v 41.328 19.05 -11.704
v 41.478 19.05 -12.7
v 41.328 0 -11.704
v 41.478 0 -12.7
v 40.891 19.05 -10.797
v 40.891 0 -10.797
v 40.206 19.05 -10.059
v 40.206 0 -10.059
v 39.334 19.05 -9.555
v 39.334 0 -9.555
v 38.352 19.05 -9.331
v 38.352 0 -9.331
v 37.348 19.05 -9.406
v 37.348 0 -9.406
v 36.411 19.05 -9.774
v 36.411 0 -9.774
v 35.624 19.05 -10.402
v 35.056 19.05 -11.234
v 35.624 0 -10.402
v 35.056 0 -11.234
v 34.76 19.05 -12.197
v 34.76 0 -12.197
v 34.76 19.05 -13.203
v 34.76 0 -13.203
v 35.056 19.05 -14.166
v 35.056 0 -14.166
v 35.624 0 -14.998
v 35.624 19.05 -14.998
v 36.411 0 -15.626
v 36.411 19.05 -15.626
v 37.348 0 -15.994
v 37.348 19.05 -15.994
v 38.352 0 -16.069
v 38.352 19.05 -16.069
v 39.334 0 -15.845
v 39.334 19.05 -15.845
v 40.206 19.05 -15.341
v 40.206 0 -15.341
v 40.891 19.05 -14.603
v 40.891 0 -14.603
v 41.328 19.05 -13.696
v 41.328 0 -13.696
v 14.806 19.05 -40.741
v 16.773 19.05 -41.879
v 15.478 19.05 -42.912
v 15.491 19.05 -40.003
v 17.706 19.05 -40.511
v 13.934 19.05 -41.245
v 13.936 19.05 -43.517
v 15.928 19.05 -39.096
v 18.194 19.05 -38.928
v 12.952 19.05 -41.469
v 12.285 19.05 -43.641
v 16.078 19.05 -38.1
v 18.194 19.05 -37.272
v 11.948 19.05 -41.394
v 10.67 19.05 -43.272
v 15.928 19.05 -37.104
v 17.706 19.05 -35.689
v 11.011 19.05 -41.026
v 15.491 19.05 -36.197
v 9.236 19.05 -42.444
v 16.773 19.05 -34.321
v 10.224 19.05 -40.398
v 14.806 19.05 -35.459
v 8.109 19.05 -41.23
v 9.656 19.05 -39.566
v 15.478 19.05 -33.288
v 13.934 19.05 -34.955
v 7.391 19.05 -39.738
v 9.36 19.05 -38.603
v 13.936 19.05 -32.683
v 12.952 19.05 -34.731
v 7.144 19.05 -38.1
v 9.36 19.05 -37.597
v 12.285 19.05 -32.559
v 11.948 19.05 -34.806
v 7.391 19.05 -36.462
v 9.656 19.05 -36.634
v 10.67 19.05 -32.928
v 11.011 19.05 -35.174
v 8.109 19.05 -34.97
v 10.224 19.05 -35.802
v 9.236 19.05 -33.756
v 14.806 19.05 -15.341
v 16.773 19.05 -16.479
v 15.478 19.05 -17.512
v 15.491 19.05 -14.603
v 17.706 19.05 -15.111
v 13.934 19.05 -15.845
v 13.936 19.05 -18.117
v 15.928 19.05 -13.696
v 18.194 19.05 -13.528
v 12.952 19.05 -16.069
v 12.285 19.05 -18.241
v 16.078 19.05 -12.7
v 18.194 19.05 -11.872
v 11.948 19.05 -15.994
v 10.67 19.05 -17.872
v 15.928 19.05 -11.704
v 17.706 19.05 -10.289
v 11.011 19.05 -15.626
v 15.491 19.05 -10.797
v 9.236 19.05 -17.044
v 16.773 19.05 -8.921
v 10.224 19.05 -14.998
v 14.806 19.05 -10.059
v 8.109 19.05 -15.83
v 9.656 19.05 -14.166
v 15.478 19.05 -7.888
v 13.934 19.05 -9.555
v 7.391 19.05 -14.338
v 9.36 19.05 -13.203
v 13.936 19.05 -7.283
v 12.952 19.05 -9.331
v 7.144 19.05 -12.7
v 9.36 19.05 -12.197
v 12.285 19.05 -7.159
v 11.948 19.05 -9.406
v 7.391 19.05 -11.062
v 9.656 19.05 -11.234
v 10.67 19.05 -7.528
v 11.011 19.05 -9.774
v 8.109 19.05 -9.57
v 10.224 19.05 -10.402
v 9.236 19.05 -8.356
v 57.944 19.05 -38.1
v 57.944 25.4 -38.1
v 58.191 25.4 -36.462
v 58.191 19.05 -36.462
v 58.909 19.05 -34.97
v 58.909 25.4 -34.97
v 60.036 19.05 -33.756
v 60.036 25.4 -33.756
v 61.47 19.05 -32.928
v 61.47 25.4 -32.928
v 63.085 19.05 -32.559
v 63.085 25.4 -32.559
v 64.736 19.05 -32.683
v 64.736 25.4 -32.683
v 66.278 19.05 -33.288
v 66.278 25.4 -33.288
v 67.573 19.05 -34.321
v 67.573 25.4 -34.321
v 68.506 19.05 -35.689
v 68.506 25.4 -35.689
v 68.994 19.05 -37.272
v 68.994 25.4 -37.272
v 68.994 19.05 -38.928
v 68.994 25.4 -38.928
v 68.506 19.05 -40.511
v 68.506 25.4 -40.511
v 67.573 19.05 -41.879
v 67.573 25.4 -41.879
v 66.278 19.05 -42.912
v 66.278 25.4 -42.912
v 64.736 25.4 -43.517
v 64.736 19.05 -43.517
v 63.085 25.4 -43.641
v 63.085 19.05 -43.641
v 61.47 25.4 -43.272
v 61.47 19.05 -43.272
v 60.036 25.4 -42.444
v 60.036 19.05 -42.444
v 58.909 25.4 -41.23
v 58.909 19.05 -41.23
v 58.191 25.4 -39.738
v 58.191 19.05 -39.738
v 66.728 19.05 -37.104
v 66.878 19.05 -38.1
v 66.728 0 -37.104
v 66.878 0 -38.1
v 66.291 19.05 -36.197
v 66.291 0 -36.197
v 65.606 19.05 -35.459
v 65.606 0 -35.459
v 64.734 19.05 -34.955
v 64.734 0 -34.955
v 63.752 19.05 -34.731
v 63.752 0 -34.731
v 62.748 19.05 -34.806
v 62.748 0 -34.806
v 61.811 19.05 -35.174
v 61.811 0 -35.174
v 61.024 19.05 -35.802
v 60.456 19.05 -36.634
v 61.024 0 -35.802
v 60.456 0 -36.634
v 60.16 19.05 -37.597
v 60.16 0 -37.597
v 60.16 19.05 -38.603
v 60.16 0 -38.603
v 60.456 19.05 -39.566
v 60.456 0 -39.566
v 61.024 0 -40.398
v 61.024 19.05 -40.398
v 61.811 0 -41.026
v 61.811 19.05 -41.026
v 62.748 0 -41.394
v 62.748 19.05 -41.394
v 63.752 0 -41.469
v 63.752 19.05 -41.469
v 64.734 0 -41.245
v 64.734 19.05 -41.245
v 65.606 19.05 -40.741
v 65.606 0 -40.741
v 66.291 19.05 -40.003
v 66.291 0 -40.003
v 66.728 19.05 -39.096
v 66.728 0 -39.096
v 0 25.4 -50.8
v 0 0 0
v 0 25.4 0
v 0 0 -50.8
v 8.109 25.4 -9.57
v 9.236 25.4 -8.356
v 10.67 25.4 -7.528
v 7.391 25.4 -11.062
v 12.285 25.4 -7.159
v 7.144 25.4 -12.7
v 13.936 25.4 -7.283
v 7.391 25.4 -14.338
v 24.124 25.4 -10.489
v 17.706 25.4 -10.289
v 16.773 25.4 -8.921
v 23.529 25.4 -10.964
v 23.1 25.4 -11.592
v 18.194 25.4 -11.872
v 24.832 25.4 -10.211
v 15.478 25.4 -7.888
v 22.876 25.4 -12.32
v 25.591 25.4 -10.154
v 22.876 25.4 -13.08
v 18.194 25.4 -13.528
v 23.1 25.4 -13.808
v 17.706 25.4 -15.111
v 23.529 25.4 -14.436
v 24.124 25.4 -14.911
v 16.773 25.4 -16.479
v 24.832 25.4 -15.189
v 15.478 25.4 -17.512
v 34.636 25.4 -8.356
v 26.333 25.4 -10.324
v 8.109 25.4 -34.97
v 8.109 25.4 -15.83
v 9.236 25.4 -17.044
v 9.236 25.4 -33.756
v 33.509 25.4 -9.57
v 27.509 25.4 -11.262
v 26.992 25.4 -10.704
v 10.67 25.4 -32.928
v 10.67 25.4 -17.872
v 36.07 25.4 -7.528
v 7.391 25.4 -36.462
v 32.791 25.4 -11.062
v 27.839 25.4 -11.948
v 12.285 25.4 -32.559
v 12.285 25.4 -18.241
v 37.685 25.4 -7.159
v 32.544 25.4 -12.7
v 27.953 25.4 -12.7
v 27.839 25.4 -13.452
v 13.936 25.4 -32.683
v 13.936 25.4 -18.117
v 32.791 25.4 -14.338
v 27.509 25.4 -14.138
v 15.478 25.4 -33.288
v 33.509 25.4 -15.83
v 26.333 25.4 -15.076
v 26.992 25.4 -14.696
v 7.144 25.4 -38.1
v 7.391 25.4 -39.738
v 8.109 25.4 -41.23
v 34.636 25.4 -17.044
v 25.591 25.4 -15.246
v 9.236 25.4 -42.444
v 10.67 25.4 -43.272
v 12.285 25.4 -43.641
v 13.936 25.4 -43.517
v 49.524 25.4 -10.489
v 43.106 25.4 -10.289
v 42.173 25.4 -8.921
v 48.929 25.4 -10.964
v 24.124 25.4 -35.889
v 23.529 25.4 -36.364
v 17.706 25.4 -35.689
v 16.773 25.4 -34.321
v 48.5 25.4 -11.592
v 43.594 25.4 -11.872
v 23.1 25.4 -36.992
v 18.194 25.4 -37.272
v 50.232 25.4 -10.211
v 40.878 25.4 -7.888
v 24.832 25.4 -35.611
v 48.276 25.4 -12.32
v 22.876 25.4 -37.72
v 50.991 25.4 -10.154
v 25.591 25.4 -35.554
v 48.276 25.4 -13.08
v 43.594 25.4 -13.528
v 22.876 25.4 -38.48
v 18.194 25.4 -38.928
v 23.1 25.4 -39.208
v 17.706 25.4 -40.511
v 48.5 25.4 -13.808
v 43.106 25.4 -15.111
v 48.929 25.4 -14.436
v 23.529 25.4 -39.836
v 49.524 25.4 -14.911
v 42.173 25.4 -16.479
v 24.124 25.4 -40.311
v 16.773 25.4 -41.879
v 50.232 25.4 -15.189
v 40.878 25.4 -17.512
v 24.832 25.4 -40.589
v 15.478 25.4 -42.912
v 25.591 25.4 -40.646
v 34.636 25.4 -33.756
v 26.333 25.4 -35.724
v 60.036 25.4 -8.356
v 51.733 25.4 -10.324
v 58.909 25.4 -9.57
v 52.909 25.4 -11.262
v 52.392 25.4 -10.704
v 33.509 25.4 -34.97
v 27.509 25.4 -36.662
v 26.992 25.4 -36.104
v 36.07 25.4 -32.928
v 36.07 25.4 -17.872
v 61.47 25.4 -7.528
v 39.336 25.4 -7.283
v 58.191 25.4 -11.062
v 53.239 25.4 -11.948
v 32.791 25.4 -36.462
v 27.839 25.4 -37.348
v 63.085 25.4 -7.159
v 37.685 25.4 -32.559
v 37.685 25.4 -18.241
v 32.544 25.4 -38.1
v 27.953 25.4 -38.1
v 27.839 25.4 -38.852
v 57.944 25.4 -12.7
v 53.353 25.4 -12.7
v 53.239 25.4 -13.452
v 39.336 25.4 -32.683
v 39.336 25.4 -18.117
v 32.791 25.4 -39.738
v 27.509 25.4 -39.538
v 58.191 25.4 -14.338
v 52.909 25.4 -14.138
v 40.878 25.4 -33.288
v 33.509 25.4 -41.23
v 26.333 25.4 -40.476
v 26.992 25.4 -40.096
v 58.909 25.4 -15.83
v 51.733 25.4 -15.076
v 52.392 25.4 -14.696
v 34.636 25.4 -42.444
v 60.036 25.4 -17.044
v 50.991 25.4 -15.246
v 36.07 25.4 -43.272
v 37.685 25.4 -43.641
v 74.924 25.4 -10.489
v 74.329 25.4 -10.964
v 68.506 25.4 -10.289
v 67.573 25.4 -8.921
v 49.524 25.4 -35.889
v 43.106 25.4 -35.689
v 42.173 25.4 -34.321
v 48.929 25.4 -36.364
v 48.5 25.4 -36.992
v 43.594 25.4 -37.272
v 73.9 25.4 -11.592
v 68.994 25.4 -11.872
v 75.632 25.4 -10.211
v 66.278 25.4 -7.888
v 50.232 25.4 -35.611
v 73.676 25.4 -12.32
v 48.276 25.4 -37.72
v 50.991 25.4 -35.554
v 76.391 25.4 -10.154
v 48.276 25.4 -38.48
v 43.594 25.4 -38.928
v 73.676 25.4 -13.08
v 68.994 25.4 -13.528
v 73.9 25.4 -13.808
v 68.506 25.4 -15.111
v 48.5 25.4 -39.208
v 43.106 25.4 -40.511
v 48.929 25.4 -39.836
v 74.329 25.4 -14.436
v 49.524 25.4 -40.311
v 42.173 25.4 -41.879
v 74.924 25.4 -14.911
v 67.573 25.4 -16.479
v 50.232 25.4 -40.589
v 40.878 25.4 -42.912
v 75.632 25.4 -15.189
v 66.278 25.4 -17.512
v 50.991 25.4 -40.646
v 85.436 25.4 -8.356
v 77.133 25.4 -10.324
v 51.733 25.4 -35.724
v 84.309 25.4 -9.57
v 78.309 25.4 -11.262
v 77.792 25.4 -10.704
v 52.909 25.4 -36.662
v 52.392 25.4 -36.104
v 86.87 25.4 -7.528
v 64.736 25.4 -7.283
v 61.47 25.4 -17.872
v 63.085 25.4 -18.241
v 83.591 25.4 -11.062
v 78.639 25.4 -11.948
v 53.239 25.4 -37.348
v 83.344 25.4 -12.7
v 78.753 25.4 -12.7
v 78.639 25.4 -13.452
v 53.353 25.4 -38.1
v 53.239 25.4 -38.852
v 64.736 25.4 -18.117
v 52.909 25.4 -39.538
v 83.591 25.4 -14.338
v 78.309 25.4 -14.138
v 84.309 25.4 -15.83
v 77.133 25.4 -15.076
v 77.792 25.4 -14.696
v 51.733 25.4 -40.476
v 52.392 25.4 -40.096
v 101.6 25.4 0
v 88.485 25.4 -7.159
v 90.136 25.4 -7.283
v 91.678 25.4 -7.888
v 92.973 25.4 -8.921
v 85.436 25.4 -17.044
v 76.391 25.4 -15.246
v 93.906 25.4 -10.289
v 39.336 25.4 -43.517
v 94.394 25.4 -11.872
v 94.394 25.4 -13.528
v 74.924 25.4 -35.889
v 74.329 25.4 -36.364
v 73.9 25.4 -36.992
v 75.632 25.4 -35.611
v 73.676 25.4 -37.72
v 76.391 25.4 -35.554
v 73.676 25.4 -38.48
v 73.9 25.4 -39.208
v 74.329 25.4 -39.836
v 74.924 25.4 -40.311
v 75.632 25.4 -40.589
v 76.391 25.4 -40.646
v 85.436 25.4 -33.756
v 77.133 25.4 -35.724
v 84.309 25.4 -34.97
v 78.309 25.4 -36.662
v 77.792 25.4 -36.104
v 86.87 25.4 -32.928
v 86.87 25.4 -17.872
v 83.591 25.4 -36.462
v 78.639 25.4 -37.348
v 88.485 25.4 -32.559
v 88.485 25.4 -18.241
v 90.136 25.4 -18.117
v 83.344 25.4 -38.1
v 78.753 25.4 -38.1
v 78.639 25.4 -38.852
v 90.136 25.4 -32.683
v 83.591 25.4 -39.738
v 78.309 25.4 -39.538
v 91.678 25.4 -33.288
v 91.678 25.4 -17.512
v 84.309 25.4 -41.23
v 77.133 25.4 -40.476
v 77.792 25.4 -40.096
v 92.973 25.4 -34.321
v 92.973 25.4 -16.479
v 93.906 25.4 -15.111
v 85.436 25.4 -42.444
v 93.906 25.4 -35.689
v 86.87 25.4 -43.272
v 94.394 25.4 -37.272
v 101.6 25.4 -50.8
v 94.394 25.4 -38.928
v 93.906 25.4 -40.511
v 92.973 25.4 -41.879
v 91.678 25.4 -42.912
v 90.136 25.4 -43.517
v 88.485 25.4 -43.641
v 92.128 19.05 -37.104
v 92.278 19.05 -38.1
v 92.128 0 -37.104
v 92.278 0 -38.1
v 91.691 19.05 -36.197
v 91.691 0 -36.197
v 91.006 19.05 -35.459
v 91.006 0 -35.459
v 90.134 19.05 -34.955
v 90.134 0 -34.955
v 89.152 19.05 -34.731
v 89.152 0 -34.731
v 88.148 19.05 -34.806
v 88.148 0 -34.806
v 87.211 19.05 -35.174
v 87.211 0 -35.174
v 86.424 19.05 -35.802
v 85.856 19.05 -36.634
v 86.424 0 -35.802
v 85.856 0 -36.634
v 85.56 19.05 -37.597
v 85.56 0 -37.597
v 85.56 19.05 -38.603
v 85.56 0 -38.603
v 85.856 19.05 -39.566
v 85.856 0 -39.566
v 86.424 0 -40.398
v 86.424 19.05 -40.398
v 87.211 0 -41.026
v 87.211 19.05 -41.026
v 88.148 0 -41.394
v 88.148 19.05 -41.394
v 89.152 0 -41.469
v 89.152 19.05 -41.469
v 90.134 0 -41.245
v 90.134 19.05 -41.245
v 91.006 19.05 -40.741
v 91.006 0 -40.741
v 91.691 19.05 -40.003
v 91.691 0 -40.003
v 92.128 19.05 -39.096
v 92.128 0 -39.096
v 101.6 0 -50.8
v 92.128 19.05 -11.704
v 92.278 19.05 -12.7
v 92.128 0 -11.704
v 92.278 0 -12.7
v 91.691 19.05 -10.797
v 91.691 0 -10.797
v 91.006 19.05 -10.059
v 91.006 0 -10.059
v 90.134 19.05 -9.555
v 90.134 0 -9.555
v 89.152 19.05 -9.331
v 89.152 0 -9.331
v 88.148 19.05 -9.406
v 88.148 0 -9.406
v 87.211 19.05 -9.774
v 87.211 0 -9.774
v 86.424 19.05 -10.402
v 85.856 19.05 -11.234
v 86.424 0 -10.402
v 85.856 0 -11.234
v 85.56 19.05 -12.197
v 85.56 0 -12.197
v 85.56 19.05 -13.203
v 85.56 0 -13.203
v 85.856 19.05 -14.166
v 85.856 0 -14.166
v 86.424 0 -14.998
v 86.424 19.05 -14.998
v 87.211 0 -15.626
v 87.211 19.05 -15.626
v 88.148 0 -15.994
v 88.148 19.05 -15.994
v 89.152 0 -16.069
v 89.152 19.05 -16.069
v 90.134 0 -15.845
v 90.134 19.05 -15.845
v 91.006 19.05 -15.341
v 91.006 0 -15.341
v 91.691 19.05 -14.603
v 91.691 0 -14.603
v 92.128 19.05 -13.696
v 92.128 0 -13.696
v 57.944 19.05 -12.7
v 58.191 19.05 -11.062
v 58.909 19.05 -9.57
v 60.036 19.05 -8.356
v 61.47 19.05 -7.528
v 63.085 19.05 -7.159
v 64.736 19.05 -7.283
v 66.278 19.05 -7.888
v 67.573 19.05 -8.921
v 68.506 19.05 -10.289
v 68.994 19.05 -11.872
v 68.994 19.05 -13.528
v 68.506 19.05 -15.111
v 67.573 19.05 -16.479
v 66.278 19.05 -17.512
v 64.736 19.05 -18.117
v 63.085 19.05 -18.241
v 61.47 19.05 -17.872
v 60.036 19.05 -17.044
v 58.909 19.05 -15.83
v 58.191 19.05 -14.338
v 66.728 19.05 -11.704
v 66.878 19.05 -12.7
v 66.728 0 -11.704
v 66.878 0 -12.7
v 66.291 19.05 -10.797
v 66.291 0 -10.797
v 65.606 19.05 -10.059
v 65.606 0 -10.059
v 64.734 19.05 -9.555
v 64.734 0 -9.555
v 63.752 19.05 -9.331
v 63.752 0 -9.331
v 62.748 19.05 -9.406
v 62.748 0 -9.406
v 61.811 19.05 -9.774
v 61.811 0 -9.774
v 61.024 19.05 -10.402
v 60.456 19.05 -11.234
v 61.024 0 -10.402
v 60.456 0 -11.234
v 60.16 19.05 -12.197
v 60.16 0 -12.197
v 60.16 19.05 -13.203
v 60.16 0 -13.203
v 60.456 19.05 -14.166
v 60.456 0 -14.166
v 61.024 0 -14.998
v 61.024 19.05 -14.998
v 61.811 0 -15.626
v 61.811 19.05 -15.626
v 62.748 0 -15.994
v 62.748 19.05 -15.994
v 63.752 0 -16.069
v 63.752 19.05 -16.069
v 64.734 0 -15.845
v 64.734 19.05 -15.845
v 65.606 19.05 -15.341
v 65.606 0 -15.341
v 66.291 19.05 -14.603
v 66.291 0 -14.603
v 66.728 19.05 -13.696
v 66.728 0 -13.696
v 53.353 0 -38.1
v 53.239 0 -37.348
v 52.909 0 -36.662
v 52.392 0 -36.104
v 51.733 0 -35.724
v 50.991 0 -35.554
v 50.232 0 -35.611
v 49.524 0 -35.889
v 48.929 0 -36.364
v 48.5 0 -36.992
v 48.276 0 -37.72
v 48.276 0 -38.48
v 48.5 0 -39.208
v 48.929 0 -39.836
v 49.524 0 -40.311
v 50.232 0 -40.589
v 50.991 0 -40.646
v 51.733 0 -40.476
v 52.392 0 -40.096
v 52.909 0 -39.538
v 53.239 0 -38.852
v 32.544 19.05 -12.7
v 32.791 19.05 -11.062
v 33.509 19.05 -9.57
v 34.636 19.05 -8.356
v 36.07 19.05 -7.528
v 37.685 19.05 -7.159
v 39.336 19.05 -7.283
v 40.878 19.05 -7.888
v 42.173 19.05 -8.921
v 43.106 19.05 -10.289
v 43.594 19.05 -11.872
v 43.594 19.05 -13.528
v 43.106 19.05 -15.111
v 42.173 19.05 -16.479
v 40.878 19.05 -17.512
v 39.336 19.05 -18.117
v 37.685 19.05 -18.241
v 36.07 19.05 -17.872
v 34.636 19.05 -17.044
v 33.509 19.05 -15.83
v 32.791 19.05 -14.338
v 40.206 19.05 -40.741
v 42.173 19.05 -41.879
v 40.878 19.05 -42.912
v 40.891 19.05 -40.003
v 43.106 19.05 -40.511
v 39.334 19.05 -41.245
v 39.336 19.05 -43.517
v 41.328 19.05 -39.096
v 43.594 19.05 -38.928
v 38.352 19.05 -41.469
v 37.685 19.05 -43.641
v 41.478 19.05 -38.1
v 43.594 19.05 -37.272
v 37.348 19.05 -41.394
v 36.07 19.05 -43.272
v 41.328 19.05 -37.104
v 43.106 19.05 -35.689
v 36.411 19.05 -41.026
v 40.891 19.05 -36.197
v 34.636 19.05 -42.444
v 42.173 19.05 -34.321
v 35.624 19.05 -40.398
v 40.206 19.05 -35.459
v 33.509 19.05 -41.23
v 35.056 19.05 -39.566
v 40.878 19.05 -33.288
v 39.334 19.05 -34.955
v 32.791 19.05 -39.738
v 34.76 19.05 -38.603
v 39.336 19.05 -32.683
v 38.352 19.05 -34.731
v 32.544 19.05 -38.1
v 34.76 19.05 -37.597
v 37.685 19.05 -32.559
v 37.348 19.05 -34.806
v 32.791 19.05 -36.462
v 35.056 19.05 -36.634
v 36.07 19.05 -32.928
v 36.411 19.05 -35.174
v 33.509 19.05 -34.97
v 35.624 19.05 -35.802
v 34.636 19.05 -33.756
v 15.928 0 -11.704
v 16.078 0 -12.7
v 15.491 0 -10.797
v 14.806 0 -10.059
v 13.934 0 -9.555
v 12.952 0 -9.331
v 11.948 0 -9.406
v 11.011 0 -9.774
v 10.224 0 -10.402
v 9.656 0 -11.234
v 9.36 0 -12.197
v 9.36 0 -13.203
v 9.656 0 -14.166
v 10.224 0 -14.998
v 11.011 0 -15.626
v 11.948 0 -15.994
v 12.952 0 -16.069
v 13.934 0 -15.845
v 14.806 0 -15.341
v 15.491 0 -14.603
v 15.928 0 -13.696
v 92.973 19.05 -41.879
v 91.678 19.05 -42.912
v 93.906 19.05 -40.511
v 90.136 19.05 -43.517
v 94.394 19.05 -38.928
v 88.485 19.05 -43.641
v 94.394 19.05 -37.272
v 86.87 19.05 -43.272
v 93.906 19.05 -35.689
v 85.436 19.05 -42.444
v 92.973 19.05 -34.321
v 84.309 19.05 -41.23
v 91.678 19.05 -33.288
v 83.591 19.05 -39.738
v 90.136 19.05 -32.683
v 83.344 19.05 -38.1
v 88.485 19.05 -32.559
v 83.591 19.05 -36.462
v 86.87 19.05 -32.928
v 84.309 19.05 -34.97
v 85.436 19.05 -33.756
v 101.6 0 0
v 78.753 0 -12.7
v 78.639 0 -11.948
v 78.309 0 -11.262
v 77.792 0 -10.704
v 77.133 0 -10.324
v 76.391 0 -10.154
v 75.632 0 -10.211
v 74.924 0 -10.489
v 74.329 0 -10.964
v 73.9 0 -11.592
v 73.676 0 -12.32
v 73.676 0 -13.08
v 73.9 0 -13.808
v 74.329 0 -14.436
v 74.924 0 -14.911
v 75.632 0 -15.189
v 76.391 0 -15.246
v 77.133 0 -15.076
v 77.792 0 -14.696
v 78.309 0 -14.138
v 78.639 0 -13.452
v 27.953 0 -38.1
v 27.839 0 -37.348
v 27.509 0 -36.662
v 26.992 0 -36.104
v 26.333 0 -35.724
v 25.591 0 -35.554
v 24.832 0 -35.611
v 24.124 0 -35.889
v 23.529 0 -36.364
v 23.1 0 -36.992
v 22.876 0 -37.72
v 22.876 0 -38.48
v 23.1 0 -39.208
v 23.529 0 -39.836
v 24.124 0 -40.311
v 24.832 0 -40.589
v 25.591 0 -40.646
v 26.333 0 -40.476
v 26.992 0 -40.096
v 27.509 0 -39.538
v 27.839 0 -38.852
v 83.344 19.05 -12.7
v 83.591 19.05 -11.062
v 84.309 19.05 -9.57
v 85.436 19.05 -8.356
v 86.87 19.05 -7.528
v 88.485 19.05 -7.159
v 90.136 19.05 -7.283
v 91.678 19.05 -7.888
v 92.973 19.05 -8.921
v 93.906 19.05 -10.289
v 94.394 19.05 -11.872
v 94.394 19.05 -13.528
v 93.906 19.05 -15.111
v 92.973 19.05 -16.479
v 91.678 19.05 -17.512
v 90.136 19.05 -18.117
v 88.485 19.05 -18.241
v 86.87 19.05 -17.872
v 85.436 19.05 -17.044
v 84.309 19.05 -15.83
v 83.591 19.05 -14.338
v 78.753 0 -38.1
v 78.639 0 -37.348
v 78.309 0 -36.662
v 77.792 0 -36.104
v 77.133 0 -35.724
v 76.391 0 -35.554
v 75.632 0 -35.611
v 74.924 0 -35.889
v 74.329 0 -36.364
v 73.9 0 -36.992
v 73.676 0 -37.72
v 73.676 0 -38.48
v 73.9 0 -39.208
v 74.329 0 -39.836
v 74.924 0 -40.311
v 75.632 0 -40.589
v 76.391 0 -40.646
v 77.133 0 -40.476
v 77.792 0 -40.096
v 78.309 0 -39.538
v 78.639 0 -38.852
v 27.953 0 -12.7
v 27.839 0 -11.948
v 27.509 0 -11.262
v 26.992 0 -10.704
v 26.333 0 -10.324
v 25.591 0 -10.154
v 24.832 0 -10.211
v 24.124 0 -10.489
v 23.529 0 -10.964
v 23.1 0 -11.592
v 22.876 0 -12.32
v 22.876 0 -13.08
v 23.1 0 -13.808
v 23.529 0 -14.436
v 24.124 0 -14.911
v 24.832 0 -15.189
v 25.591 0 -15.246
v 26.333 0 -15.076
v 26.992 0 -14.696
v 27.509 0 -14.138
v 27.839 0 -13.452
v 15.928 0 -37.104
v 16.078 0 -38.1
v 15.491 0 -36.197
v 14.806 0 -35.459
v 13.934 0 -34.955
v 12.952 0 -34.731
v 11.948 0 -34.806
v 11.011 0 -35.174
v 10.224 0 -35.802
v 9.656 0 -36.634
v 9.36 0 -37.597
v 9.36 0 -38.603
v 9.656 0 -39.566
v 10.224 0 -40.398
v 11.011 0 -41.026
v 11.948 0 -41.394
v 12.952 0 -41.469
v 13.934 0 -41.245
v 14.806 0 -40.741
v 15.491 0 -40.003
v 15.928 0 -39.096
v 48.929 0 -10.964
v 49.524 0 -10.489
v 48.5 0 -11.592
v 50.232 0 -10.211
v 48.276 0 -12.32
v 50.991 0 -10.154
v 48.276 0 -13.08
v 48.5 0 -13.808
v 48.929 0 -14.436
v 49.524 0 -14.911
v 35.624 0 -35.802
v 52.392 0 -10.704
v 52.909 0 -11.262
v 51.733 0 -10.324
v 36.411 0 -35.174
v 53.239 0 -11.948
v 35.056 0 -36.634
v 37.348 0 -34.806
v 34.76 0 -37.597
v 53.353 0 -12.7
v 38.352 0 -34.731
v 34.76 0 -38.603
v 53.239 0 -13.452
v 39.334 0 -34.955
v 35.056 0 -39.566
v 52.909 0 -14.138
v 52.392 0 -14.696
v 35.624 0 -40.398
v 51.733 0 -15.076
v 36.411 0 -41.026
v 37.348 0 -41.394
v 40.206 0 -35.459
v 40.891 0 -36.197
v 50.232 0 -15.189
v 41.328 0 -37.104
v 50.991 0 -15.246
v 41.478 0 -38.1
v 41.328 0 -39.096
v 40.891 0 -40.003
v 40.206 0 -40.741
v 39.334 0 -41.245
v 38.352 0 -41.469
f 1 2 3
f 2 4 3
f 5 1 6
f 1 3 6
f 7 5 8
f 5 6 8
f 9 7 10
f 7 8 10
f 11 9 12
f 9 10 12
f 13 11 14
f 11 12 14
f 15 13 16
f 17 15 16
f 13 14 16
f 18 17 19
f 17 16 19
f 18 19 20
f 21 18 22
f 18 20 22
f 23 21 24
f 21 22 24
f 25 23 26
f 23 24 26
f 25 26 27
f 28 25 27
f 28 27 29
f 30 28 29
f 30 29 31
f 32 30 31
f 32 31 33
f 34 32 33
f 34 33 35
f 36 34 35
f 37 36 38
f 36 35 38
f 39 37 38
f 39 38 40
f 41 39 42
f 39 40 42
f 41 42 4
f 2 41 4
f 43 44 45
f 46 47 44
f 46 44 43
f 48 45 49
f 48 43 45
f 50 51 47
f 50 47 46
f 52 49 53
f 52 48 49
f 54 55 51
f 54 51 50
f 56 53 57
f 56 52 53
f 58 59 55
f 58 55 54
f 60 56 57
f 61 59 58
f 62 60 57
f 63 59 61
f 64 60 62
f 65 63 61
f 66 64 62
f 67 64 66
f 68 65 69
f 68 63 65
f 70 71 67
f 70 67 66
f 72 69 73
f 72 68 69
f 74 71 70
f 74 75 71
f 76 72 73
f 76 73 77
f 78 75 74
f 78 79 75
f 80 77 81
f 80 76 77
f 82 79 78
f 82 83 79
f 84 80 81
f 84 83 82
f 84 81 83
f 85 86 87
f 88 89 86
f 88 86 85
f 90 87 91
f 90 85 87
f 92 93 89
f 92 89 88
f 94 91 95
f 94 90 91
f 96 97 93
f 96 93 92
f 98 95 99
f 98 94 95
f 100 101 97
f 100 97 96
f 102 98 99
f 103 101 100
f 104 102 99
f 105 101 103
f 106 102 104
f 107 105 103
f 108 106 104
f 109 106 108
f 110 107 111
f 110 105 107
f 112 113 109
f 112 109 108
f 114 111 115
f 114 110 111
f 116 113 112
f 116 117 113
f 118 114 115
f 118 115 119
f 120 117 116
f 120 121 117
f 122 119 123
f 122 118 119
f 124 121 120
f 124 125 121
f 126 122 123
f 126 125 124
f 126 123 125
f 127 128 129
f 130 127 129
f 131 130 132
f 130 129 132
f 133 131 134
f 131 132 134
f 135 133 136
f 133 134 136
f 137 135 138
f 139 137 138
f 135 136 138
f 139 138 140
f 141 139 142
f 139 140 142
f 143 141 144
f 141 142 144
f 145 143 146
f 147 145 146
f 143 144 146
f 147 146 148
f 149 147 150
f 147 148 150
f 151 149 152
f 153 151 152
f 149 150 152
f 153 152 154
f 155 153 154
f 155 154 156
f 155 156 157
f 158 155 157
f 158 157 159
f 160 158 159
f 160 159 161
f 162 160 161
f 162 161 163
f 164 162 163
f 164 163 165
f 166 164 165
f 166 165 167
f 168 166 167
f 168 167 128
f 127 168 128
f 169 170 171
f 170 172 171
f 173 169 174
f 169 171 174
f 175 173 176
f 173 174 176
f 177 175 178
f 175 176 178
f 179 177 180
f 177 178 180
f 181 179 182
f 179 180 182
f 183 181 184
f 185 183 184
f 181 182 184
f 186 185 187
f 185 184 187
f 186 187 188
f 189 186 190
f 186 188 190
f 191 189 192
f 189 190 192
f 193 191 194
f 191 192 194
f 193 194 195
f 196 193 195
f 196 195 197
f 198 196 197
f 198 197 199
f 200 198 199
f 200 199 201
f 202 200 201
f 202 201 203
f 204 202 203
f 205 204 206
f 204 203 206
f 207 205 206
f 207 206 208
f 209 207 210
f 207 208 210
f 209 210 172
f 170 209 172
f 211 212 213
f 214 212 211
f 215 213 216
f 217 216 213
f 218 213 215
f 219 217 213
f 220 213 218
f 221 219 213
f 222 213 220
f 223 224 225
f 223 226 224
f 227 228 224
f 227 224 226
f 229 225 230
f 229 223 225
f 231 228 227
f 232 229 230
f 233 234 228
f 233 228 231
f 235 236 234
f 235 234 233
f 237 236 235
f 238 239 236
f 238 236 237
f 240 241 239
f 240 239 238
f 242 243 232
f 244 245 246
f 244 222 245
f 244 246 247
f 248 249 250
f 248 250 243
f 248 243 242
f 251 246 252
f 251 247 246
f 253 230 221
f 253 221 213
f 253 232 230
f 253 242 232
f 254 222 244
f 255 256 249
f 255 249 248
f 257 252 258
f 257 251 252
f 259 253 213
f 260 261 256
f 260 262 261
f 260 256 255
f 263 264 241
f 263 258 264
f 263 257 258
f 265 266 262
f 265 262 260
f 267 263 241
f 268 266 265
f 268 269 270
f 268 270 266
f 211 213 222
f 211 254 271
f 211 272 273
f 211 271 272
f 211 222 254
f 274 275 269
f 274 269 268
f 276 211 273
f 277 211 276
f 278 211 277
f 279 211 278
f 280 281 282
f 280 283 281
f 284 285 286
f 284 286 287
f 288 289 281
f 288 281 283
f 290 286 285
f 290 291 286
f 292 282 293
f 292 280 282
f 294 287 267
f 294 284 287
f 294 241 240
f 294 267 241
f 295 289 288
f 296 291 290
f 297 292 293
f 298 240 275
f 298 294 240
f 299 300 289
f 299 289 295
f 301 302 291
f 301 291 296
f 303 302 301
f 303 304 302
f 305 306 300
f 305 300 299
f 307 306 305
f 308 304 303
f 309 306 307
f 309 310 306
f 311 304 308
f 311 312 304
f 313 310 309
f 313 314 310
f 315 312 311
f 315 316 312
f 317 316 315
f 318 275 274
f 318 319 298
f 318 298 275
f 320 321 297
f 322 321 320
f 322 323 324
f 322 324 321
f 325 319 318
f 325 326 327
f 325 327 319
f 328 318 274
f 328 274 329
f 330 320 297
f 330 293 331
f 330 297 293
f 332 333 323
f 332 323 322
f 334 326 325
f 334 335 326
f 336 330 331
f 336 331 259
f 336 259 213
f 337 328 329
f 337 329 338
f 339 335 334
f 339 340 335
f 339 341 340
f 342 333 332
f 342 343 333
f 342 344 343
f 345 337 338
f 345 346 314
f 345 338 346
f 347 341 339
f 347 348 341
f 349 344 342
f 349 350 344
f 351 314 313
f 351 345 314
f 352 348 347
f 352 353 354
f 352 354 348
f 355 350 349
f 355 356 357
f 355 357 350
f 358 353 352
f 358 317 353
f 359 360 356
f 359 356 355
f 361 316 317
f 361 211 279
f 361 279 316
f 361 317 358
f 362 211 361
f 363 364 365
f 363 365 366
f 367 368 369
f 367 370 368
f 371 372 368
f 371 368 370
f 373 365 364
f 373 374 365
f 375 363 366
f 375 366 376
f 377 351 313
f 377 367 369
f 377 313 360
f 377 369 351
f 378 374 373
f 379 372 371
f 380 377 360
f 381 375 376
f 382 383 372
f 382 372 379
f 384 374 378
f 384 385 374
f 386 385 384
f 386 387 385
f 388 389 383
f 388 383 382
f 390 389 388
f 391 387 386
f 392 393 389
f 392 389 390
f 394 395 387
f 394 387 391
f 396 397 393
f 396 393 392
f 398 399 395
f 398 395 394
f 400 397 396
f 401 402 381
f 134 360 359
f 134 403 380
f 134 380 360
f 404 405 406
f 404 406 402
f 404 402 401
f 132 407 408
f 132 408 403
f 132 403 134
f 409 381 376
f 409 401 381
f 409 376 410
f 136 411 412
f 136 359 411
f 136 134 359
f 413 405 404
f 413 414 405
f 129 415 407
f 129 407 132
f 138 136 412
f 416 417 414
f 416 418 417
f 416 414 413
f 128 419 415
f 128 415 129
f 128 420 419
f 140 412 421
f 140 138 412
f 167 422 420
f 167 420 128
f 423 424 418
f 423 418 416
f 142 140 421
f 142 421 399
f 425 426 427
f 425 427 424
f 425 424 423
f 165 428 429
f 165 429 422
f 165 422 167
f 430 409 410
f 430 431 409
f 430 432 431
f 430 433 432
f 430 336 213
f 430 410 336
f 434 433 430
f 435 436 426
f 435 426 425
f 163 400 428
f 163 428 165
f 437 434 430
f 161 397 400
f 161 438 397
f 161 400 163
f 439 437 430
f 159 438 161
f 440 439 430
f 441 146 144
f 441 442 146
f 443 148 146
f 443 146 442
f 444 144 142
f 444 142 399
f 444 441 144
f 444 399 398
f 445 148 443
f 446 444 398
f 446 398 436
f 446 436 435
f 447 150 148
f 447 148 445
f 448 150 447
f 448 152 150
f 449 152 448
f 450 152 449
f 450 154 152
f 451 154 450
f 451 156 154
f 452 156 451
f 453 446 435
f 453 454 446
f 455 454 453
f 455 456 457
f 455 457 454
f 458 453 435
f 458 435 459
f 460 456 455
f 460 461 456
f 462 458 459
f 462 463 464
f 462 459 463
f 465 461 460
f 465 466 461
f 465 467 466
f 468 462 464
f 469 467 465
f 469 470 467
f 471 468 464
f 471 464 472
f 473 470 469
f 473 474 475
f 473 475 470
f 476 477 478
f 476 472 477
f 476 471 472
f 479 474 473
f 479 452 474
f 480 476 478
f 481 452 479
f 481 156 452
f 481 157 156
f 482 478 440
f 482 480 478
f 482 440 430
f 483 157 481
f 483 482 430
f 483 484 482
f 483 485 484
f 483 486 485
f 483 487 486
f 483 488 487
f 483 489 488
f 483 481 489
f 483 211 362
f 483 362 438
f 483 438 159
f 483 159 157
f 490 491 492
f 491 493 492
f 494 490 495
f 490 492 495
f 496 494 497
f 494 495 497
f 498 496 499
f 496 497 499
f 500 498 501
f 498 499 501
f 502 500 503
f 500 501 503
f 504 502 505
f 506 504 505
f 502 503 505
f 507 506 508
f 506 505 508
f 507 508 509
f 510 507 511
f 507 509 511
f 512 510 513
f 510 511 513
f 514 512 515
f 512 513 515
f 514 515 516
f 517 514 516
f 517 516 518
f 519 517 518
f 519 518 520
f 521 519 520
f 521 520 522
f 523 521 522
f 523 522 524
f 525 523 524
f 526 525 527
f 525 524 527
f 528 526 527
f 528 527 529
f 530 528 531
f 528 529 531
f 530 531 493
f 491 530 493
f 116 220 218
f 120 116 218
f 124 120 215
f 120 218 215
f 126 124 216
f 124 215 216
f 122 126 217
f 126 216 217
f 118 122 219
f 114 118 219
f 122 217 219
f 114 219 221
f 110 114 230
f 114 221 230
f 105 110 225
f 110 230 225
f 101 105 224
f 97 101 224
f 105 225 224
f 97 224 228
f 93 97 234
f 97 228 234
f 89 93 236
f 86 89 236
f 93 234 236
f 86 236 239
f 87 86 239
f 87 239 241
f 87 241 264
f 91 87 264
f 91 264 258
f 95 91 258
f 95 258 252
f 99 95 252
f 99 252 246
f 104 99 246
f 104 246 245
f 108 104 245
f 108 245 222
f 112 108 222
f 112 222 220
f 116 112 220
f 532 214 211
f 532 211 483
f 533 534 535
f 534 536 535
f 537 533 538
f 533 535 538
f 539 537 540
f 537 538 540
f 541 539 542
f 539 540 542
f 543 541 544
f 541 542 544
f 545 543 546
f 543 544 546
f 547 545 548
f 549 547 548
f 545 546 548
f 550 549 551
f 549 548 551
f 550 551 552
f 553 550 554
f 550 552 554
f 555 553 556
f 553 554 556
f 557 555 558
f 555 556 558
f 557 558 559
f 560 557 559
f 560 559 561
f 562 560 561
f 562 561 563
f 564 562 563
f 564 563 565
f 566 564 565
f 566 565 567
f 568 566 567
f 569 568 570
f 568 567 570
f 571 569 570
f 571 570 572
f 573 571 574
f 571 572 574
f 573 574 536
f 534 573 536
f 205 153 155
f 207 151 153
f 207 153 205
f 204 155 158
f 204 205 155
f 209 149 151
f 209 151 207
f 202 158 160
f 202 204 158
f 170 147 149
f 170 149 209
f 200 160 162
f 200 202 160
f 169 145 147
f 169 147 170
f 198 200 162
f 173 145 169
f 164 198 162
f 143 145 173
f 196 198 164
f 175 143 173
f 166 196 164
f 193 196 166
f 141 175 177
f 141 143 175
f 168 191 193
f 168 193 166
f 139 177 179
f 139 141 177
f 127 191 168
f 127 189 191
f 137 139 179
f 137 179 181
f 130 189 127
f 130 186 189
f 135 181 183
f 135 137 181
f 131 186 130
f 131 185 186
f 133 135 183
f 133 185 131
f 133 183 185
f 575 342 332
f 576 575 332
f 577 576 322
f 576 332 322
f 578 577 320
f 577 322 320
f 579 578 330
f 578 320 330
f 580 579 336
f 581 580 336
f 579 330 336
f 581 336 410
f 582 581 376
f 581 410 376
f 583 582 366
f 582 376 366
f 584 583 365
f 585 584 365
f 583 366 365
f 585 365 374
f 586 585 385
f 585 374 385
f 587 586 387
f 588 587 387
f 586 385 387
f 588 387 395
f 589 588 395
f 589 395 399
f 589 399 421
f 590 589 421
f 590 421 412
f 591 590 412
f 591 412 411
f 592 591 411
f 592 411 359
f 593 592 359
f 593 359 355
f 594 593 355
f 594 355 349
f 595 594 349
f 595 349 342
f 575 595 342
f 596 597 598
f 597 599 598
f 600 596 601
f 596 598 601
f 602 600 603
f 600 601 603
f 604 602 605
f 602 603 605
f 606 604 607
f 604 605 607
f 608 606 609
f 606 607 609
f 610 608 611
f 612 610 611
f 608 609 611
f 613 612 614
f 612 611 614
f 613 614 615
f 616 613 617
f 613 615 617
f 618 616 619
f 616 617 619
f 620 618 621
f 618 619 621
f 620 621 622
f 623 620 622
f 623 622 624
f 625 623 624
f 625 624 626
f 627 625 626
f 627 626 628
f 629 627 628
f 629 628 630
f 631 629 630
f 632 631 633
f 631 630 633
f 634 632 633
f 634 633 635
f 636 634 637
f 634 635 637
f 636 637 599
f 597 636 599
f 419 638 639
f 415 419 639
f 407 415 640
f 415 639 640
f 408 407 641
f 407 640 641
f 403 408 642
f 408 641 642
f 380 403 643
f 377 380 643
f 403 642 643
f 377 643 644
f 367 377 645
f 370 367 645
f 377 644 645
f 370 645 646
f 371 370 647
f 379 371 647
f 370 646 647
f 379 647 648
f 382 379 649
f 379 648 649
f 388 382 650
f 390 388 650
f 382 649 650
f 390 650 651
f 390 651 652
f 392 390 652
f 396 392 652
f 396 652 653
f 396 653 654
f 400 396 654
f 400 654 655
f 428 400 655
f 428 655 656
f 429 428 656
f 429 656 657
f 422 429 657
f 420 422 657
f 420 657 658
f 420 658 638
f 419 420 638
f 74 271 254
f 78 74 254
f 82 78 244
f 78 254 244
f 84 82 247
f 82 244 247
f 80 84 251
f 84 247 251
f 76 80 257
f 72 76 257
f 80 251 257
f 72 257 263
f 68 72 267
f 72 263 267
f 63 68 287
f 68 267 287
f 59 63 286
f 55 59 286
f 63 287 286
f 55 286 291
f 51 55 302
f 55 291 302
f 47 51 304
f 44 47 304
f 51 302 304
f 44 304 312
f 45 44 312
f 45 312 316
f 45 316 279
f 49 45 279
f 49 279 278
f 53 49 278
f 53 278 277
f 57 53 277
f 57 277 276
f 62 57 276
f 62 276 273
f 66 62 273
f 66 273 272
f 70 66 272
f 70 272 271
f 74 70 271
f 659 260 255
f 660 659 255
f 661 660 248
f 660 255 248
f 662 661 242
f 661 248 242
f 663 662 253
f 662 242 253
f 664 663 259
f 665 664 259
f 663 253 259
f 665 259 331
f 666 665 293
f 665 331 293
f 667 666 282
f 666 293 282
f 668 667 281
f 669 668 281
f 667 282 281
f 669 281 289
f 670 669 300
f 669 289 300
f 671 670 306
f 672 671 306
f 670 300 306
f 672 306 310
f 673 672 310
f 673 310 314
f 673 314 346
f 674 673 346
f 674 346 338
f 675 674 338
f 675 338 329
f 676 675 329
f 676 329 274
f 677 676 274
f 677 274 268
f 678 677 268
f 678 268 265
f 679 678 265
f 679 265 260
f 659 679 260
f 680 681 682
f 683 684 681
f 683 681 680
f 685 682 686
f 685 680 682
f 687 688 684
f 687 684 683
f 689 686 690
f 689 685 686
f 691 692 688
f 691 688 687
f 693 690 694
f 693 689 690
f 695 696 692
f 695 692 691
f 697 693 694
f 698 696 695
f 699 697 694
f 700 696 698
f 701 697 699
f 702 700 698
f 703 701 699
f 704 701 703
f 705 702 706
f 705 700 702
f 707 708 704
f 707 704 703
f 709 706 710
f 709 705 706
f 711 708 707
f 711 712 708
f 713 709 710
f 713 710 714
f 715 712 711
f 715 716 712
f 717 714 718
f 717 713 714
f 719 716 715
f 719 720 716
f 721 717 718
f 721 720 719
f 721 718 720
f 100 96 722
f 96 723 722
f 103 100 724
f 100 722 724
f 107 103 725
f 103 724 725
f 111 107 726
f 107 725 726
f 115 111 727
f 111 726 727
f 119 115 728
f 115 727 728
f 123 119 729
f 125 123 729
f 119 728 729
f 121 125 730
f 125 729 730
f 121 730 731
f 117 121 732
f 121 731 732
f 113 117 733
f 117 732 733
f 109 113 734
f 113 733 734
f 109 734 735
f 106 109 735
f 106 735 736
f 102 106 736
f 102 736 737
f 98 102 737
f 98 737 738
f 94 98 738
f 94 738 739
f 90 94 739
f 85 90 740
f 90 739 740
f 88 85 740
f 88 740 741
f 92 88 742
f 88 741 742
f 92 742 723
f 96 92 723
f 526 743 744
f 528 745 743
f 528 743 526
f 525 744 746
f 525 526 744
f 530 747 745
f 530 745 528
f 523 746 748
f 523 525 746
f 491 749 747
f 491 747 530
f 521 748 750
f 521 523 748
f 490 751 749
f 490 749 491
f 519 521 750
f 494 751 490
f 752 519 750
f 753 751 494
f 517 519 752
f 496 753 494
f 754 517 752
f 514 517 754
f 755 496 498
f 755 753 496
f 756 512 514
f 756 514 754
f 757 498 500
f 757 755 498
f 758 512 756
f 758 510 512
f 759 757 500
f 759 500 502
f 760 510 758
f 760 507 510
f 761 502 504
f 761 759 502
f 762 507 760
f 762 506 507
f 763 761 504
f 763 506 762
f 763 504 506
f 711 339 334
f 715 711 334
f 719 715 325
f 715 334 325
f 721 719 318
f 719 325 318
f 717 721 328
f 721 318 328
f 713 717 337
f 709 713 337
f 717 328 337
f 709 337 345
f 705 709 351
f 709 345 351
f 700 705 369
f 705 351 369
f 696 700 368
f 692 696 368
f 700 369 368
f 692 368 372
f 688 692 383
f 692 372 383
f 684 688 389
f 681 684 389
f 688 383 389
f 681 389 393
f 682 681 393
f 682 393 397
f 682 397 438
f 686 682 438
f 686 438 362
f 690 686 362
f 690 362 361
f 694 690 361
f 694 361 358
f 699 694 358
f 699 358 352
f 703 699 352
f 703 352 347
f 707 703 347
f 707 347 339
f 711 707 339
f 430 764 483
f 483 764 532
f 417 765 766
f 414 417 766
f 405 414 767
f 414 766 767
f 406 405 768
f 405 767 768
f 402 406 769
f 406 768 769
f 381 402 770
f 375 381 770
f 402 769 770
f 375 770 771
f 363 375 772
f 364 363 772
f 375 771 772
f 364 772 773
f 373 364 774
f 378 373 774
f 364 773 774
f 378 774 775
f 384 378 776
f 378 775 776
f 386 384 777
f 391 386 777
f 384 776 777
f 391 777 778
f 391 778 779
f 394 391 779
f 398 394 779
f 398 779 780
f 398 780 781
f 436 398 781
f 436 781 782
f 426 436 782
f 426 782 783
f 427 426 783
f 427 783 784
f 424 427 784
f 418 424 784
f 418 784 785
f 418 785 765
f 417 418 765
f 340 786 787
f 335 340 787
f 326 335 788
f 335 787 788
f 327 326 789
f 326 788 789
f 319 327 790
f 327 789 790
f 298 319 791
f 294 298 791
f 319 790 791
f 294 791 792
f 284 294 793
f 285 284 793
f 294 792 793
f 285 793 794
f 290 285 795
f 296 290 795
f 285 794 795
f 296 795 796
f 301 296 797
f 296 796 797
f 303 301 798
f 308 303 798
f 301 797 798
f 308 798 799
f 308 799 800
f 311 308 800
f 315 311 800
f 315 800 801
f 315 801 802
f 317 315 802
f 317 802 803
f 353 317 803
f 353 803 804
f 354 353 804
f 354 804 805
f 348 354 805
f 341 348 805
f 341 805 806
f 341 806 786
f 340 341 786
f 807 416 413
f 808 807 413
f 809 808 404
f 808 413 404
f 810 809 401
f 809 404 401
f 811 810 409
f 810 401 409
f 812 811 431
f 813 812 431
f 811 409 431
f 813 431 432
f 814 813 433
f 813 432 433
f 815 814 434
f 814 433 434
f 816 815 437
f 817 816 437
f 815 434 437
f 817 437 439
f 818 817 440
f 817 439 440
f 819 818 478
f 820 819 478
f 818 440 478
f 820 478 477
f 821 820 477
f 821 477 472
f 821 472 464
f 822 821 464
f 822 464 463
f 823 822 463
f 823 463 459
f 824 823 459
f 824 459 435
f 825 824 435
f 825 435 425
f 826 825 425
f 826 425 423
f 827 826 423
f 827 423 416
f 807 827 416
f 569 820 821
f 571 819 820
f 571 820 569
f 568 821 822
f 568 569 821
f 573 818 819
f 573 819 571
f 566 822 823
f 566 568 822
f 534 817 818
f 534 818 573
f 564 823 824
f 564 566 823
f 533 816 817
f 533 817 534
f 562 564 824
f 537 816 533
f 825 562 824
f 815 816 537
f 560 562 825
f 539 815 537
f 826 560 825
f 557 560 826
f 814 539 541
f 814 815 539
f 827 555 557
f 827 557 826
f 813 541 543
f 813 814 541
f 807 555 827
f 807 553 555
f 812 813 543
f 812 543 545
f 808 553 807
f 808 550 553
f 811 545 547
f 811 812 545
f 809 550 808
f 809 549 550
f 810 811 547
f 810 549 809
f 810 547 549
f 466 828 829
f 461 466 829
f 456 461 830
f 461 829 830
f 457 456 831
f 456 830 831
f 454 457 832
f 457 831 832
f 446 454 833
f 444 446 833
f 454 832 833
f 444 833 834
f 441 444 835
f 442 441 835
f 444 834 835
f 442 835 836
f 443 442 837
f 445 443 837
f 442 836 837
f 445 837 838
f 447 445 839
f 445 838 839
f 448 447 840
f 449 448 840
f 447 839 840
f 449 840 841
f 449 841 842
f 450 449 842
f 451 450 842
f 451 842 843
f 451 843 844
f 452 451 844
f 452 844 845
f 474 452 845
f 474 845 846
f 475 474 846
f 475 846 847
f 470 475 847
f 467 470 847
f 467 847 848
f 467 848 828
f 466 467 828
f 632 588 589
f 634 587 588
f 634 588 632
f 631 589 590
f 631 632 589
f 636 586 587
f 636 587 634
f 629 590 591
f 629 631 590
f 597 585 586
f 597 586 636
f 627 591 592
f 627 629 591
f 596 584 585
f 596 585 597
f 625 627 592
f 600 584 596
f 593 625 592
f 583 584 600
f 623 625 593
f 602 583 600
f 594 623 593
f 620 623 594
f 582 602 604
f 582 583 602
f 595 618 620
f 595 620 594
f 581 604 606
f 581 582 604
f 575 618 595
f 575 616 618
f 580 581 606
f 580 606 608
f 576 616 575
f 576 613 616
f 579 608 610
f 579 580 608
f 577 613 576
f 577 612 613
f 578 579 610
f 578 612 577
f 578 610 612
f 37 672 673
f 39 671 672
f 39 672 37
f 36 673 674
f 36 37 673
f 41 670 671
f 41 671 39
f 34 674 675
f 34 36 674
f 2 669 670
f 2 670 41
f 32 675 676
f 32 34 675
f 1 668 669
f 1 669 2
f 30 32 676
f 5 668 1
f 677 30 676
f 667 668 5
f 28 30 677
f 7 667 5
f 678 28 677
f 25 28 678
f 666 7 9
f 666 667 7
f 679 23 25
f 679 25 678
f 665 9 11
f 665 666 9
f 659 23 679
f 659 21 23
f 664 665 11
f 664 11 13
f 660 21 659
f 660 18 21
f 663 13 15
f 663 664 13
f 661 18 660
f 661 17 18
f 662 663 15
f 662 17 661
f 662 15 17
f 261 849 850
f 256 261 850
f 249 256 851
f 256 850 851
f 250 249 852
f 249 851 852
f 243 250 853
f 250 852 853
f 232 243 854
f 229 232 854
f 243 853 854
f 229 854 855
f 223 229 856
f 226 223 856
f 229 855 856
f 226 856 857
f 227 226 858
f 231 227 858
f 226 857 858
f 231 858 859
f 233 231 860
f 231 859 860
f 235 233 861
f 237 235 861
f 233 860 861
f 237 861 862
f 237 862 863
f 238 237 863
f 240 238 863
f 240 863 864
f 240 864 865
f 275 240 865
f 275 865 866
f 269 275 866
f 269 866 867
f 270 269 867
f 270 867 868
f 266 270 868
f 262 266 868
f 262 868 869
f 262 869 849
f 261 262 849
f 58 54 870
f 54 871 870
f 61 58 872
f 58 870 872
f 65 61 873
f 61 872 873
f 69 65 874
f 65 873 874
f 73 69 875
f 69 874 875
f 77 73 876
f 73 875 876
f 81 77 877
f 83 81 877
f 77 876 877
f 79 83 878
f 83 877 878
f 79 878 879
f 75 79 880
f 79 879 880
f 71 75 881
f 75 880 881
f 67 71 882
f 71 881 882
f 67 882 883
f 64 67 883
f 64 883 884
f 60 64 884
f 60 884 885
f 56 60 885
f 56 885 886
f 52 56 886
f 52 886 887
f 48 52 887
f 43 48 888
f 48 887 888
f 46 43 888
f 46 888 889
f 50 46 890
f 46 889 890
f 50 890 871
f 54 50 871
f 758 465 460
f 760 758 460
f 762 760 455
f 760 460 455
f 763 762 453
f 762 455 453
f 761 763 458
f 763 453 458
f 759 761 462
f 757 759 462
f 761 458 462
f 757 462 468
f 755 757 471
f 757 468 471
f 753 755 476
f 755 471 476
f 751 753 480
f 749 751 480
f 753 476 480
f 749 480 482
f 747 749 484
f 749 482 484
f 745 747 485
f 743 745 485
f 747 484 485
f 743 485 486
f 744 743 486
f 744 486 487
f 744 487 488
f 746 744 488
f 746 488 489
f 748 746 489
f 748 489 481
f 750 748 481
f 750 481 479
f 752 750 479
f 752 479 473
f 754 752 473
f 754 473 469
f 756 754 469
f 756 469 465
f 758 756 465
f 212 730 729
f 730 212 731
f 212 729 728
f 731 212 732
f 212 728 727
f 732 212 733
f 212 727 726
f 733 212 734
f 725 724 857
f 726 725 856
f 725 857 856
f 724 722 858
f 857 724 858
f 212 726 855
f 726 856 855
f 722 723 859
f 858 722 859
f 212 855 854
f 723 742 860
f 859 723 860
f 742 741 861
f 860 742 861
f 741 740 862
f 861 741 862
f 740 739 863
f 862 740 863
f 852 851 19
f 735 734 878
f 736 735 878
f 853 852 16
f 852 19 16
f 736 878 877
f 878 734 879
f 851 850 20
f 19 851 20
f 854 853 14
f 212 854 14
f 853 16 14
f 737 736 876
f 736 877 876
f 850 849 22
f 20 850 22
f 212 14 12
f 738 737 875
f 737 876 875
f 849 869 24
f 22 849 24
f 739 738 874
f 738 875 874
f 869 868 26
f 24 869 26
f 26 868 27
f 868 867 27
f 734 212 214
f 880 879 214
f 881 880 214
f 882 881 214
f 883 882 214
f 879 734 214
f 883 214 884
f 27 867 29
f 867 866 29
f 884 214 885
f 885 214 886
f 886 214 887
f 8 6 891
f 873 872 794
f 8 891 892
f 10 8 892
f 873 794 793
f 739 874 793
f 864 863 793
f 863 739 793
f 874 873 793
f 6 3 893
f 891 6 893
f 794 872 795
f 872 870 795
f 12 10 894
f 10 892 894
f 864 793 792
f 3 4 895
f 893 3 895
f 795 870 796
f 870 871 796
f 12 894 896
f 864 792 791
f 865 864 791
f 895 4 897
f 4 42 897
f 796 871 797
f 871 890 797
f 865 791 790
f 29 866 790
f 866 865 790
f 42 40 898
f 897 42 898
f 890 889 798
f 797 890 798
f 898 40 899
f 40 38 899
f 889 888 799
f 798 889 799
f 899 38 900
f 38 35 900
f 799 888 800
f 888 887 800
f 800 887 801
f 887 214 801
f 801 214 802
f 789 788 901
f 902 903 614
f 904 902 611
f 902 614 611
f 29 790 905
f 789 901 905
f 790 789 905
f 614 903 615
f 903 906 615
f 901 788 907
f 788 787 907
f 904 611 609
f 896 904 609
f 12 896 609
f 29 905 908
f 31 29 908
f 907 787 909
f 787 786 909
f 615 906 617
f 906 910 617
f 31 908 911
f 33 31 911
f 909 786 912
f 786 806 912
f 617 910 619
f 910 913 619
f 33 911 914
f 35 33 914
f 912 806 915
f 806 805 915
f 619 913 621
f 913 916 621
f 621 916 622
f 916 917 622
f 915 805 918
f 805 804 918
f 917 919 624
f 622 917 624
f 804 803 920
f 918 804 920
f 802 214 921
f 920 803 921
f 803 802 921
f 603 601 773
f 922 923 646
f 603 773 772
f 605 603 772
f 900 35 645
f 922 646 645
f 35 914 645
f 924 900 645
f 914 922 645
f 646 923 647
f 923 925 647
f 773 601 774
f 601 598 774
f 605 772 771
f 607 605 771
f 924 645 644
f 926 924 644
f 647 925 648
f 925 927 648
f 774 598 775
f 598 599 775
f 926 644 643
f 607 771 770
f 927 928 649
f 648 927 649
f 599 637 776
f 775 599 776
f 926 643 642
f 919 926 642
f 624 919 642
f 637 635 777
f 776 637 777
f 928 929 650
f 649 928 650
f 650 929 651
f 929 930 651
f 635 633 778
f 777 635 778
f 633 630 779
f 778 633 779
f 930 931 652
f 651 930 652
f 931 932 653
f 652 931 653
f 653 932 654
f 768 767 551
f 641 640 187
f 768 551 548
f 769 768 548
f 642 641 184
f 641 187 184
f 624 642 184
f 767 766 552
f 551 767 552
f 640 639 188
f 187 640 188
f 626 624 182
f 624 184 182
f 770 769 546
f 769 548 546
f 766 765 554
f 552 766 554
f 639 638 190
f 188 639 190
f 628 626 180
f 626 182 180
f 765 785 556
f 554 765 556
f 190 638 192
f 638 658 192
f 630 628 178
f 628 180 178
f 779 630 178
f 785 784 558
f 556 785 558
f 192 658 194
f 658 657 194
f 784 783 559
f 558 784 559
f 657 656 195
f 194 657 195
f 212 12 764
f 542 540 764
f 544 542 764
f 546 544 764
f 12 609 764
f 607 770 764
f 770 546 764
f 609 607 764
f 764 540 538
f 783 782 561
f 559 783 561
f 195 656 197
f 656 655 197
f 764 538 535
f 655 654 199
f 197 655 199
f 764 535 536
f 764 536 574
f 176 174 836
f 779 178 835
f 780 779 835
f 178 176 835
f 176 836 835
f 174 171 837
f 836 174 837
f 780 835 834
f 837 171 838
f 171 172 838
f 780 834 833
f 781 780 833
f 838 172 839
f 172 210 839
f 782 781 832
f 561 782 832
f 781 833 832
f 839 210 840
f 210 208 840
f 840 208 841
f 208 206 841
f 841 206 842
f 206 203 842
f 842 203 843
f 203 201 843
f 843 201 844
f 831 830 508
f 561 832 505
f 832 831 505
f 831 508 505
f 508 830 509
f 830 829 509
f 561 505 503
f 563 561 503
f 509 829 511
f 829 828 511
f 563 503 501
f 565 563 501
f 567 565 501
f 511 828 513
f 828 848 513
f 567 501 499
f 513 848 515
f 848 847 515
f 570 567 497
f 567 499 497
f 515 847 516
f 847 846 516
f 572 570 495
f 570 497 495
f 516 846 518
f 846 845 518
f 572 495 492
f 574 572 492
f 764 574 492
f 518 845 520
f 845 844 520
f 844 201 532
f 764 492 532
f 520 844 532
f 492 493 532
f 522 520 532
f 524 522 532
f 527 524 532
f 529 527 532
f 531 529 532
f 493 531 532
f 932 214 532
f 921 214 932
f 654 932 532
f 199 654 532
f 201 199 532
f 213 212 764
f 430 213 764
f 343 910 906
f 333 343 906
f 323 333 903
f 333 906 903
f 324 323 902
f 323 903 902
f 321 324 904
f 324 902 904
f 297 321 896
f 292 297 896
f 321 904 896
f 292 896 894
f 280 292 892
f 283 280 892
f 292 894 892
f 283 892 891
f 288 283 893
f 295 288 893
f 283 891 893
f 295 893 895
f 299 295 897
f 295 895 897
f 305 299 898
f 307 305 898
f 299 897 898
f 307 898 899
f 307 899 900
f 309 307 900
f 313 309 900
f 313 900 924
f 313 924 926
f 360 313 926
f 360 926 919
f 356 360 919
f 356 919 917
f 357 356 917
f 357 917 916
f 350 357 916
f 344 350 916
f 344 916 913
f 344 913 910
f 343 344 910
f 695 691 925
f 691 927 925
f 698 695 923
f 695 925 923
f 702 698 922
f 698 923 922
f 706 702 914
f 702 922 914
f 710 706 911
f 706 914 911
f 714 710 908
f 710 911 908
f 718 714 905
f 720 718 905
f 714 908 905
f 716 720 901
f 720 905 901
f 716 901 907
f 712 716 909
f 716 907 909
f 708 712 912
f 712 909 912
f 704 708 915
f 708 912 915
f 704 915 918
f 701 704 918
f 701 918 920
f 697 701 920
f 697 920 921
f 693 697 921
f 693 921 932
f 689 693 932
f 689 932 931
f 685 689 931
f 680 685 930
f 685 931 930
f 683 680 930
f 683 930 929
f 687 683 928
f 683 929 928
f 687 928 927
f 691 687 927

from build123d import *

# Parameters (mm, degrees)
SKETCH1_W                                        = 101.6
SKETCH1_H                                        = 50.8
BOSS_EXTRUDE1_DEPTH                              = 25.4
CBORE_FOR_1_4_SOCKET_HEAD_CAP_SCREW1_D           = 6.7564
CBORE_FOR_1_4_SOCKET_HEAD_CAP_SCREW1_CBORE_D     = 11.1125
CBORE_FOR_1_4_SOCKET_HEAD_CAP_SCREW1_CBORE_DEPTH = 6.35
LPATTERN1_COUNT                                  = 2
LPATTERN1_PITCH                                  = 25.4
LPATTERN1_COUNT_DIR2                             = 4
LPATTERN1_PITCH_DIR2                             = 25.4
F_1_4_20_TAPPED_HOLE1_D                          = 5.1054
LPATTERN2_COUNT                                  = 2
LPATTERN2_PITCH                                  = 25.4
LPATTERN2_COUNT_DIR2                             = 3
LPATTERN2_PITCH_DIR2                             = 25.4


with BuildPart() as part:
    # Sketch1 → Boss-Extrude1 (new body)
    with BuildSketch(Plane(origin=(0, 0, 0), x_dir=(1, 0, 0), z_dir=(0, 1, 0))):
        with Locations((50.8, 25.4)):
            Rectangle(SKETCH1_W, SKETCH1_H)
    extrude(amount=BOSS_EXTRUDE1_DEPTH)

    # CBORE for 1/4 Socket Head Cap Screw1 (through all)
    with Locations(Plane(origin=(0, 25.4, 0), x_dir=(-1, 0, 0), z_dir=(0, 1, 0))):
        with Locations((-12.7, -12.7)):
            cbore_for_1_4_socket_head_cap_screw1 = CounterBoreHole(CBORE_FOR_1_4_SOCKET_HEAD_CAP_SCREW1_D / 2, CBORE_FOR_1_4_SOCKET_HEAD_CAP_SCREW1_CBORE_D / 2, CBORE_FOR_1_4_SOCKET_HEAD_CAP_SCREW1_CBORE_DEPTH)

    # LPattern1: CBORE for 1_4 Socket Head Cap Screw1 2 × 4
    with Locations(*[(j * LPATTERN1_PITCH_DIR2, 0, -i * LPATTERN1_PITCH) for i in range(LPATTERN1_COUNT) for j in range(LPATTERN1_COUNT_DIR2) if (i, j) != (0, 0)]):
        add(cbore_for_1_4_socket_head_cap_screw1, mode=Mode.SUBTRACT)

    # 1/4-20 Tapped Hole1 (through all)
    with Locations(Plane(origin=(0, 25.4, 0), x_dir=(-1, 0, 0), z_dir=(0, 1, 0))):
        with Locations((-25.4, -38.1)):
            f_1_4_20_tapped_hole1 = Hole(F_1_4_20_TAPPED_HOLE1_D / 2)

    # LPattern2: 1_4-20 Tapped Hole1 2 × 3
    with Locations(*[(j * LPATTERN2_PITCH_DIR2, 0, i * LPATTERN2_PITCH) for i in range(LPATTERN2_COUNT) for j in range(LPATTERN2_COUNT_DIR2) if (i, j) != (0, 0)]):
        add(f_1_4_20_tapped_hole1, mode=Mode.SUBTRACT)


solid = part.part
